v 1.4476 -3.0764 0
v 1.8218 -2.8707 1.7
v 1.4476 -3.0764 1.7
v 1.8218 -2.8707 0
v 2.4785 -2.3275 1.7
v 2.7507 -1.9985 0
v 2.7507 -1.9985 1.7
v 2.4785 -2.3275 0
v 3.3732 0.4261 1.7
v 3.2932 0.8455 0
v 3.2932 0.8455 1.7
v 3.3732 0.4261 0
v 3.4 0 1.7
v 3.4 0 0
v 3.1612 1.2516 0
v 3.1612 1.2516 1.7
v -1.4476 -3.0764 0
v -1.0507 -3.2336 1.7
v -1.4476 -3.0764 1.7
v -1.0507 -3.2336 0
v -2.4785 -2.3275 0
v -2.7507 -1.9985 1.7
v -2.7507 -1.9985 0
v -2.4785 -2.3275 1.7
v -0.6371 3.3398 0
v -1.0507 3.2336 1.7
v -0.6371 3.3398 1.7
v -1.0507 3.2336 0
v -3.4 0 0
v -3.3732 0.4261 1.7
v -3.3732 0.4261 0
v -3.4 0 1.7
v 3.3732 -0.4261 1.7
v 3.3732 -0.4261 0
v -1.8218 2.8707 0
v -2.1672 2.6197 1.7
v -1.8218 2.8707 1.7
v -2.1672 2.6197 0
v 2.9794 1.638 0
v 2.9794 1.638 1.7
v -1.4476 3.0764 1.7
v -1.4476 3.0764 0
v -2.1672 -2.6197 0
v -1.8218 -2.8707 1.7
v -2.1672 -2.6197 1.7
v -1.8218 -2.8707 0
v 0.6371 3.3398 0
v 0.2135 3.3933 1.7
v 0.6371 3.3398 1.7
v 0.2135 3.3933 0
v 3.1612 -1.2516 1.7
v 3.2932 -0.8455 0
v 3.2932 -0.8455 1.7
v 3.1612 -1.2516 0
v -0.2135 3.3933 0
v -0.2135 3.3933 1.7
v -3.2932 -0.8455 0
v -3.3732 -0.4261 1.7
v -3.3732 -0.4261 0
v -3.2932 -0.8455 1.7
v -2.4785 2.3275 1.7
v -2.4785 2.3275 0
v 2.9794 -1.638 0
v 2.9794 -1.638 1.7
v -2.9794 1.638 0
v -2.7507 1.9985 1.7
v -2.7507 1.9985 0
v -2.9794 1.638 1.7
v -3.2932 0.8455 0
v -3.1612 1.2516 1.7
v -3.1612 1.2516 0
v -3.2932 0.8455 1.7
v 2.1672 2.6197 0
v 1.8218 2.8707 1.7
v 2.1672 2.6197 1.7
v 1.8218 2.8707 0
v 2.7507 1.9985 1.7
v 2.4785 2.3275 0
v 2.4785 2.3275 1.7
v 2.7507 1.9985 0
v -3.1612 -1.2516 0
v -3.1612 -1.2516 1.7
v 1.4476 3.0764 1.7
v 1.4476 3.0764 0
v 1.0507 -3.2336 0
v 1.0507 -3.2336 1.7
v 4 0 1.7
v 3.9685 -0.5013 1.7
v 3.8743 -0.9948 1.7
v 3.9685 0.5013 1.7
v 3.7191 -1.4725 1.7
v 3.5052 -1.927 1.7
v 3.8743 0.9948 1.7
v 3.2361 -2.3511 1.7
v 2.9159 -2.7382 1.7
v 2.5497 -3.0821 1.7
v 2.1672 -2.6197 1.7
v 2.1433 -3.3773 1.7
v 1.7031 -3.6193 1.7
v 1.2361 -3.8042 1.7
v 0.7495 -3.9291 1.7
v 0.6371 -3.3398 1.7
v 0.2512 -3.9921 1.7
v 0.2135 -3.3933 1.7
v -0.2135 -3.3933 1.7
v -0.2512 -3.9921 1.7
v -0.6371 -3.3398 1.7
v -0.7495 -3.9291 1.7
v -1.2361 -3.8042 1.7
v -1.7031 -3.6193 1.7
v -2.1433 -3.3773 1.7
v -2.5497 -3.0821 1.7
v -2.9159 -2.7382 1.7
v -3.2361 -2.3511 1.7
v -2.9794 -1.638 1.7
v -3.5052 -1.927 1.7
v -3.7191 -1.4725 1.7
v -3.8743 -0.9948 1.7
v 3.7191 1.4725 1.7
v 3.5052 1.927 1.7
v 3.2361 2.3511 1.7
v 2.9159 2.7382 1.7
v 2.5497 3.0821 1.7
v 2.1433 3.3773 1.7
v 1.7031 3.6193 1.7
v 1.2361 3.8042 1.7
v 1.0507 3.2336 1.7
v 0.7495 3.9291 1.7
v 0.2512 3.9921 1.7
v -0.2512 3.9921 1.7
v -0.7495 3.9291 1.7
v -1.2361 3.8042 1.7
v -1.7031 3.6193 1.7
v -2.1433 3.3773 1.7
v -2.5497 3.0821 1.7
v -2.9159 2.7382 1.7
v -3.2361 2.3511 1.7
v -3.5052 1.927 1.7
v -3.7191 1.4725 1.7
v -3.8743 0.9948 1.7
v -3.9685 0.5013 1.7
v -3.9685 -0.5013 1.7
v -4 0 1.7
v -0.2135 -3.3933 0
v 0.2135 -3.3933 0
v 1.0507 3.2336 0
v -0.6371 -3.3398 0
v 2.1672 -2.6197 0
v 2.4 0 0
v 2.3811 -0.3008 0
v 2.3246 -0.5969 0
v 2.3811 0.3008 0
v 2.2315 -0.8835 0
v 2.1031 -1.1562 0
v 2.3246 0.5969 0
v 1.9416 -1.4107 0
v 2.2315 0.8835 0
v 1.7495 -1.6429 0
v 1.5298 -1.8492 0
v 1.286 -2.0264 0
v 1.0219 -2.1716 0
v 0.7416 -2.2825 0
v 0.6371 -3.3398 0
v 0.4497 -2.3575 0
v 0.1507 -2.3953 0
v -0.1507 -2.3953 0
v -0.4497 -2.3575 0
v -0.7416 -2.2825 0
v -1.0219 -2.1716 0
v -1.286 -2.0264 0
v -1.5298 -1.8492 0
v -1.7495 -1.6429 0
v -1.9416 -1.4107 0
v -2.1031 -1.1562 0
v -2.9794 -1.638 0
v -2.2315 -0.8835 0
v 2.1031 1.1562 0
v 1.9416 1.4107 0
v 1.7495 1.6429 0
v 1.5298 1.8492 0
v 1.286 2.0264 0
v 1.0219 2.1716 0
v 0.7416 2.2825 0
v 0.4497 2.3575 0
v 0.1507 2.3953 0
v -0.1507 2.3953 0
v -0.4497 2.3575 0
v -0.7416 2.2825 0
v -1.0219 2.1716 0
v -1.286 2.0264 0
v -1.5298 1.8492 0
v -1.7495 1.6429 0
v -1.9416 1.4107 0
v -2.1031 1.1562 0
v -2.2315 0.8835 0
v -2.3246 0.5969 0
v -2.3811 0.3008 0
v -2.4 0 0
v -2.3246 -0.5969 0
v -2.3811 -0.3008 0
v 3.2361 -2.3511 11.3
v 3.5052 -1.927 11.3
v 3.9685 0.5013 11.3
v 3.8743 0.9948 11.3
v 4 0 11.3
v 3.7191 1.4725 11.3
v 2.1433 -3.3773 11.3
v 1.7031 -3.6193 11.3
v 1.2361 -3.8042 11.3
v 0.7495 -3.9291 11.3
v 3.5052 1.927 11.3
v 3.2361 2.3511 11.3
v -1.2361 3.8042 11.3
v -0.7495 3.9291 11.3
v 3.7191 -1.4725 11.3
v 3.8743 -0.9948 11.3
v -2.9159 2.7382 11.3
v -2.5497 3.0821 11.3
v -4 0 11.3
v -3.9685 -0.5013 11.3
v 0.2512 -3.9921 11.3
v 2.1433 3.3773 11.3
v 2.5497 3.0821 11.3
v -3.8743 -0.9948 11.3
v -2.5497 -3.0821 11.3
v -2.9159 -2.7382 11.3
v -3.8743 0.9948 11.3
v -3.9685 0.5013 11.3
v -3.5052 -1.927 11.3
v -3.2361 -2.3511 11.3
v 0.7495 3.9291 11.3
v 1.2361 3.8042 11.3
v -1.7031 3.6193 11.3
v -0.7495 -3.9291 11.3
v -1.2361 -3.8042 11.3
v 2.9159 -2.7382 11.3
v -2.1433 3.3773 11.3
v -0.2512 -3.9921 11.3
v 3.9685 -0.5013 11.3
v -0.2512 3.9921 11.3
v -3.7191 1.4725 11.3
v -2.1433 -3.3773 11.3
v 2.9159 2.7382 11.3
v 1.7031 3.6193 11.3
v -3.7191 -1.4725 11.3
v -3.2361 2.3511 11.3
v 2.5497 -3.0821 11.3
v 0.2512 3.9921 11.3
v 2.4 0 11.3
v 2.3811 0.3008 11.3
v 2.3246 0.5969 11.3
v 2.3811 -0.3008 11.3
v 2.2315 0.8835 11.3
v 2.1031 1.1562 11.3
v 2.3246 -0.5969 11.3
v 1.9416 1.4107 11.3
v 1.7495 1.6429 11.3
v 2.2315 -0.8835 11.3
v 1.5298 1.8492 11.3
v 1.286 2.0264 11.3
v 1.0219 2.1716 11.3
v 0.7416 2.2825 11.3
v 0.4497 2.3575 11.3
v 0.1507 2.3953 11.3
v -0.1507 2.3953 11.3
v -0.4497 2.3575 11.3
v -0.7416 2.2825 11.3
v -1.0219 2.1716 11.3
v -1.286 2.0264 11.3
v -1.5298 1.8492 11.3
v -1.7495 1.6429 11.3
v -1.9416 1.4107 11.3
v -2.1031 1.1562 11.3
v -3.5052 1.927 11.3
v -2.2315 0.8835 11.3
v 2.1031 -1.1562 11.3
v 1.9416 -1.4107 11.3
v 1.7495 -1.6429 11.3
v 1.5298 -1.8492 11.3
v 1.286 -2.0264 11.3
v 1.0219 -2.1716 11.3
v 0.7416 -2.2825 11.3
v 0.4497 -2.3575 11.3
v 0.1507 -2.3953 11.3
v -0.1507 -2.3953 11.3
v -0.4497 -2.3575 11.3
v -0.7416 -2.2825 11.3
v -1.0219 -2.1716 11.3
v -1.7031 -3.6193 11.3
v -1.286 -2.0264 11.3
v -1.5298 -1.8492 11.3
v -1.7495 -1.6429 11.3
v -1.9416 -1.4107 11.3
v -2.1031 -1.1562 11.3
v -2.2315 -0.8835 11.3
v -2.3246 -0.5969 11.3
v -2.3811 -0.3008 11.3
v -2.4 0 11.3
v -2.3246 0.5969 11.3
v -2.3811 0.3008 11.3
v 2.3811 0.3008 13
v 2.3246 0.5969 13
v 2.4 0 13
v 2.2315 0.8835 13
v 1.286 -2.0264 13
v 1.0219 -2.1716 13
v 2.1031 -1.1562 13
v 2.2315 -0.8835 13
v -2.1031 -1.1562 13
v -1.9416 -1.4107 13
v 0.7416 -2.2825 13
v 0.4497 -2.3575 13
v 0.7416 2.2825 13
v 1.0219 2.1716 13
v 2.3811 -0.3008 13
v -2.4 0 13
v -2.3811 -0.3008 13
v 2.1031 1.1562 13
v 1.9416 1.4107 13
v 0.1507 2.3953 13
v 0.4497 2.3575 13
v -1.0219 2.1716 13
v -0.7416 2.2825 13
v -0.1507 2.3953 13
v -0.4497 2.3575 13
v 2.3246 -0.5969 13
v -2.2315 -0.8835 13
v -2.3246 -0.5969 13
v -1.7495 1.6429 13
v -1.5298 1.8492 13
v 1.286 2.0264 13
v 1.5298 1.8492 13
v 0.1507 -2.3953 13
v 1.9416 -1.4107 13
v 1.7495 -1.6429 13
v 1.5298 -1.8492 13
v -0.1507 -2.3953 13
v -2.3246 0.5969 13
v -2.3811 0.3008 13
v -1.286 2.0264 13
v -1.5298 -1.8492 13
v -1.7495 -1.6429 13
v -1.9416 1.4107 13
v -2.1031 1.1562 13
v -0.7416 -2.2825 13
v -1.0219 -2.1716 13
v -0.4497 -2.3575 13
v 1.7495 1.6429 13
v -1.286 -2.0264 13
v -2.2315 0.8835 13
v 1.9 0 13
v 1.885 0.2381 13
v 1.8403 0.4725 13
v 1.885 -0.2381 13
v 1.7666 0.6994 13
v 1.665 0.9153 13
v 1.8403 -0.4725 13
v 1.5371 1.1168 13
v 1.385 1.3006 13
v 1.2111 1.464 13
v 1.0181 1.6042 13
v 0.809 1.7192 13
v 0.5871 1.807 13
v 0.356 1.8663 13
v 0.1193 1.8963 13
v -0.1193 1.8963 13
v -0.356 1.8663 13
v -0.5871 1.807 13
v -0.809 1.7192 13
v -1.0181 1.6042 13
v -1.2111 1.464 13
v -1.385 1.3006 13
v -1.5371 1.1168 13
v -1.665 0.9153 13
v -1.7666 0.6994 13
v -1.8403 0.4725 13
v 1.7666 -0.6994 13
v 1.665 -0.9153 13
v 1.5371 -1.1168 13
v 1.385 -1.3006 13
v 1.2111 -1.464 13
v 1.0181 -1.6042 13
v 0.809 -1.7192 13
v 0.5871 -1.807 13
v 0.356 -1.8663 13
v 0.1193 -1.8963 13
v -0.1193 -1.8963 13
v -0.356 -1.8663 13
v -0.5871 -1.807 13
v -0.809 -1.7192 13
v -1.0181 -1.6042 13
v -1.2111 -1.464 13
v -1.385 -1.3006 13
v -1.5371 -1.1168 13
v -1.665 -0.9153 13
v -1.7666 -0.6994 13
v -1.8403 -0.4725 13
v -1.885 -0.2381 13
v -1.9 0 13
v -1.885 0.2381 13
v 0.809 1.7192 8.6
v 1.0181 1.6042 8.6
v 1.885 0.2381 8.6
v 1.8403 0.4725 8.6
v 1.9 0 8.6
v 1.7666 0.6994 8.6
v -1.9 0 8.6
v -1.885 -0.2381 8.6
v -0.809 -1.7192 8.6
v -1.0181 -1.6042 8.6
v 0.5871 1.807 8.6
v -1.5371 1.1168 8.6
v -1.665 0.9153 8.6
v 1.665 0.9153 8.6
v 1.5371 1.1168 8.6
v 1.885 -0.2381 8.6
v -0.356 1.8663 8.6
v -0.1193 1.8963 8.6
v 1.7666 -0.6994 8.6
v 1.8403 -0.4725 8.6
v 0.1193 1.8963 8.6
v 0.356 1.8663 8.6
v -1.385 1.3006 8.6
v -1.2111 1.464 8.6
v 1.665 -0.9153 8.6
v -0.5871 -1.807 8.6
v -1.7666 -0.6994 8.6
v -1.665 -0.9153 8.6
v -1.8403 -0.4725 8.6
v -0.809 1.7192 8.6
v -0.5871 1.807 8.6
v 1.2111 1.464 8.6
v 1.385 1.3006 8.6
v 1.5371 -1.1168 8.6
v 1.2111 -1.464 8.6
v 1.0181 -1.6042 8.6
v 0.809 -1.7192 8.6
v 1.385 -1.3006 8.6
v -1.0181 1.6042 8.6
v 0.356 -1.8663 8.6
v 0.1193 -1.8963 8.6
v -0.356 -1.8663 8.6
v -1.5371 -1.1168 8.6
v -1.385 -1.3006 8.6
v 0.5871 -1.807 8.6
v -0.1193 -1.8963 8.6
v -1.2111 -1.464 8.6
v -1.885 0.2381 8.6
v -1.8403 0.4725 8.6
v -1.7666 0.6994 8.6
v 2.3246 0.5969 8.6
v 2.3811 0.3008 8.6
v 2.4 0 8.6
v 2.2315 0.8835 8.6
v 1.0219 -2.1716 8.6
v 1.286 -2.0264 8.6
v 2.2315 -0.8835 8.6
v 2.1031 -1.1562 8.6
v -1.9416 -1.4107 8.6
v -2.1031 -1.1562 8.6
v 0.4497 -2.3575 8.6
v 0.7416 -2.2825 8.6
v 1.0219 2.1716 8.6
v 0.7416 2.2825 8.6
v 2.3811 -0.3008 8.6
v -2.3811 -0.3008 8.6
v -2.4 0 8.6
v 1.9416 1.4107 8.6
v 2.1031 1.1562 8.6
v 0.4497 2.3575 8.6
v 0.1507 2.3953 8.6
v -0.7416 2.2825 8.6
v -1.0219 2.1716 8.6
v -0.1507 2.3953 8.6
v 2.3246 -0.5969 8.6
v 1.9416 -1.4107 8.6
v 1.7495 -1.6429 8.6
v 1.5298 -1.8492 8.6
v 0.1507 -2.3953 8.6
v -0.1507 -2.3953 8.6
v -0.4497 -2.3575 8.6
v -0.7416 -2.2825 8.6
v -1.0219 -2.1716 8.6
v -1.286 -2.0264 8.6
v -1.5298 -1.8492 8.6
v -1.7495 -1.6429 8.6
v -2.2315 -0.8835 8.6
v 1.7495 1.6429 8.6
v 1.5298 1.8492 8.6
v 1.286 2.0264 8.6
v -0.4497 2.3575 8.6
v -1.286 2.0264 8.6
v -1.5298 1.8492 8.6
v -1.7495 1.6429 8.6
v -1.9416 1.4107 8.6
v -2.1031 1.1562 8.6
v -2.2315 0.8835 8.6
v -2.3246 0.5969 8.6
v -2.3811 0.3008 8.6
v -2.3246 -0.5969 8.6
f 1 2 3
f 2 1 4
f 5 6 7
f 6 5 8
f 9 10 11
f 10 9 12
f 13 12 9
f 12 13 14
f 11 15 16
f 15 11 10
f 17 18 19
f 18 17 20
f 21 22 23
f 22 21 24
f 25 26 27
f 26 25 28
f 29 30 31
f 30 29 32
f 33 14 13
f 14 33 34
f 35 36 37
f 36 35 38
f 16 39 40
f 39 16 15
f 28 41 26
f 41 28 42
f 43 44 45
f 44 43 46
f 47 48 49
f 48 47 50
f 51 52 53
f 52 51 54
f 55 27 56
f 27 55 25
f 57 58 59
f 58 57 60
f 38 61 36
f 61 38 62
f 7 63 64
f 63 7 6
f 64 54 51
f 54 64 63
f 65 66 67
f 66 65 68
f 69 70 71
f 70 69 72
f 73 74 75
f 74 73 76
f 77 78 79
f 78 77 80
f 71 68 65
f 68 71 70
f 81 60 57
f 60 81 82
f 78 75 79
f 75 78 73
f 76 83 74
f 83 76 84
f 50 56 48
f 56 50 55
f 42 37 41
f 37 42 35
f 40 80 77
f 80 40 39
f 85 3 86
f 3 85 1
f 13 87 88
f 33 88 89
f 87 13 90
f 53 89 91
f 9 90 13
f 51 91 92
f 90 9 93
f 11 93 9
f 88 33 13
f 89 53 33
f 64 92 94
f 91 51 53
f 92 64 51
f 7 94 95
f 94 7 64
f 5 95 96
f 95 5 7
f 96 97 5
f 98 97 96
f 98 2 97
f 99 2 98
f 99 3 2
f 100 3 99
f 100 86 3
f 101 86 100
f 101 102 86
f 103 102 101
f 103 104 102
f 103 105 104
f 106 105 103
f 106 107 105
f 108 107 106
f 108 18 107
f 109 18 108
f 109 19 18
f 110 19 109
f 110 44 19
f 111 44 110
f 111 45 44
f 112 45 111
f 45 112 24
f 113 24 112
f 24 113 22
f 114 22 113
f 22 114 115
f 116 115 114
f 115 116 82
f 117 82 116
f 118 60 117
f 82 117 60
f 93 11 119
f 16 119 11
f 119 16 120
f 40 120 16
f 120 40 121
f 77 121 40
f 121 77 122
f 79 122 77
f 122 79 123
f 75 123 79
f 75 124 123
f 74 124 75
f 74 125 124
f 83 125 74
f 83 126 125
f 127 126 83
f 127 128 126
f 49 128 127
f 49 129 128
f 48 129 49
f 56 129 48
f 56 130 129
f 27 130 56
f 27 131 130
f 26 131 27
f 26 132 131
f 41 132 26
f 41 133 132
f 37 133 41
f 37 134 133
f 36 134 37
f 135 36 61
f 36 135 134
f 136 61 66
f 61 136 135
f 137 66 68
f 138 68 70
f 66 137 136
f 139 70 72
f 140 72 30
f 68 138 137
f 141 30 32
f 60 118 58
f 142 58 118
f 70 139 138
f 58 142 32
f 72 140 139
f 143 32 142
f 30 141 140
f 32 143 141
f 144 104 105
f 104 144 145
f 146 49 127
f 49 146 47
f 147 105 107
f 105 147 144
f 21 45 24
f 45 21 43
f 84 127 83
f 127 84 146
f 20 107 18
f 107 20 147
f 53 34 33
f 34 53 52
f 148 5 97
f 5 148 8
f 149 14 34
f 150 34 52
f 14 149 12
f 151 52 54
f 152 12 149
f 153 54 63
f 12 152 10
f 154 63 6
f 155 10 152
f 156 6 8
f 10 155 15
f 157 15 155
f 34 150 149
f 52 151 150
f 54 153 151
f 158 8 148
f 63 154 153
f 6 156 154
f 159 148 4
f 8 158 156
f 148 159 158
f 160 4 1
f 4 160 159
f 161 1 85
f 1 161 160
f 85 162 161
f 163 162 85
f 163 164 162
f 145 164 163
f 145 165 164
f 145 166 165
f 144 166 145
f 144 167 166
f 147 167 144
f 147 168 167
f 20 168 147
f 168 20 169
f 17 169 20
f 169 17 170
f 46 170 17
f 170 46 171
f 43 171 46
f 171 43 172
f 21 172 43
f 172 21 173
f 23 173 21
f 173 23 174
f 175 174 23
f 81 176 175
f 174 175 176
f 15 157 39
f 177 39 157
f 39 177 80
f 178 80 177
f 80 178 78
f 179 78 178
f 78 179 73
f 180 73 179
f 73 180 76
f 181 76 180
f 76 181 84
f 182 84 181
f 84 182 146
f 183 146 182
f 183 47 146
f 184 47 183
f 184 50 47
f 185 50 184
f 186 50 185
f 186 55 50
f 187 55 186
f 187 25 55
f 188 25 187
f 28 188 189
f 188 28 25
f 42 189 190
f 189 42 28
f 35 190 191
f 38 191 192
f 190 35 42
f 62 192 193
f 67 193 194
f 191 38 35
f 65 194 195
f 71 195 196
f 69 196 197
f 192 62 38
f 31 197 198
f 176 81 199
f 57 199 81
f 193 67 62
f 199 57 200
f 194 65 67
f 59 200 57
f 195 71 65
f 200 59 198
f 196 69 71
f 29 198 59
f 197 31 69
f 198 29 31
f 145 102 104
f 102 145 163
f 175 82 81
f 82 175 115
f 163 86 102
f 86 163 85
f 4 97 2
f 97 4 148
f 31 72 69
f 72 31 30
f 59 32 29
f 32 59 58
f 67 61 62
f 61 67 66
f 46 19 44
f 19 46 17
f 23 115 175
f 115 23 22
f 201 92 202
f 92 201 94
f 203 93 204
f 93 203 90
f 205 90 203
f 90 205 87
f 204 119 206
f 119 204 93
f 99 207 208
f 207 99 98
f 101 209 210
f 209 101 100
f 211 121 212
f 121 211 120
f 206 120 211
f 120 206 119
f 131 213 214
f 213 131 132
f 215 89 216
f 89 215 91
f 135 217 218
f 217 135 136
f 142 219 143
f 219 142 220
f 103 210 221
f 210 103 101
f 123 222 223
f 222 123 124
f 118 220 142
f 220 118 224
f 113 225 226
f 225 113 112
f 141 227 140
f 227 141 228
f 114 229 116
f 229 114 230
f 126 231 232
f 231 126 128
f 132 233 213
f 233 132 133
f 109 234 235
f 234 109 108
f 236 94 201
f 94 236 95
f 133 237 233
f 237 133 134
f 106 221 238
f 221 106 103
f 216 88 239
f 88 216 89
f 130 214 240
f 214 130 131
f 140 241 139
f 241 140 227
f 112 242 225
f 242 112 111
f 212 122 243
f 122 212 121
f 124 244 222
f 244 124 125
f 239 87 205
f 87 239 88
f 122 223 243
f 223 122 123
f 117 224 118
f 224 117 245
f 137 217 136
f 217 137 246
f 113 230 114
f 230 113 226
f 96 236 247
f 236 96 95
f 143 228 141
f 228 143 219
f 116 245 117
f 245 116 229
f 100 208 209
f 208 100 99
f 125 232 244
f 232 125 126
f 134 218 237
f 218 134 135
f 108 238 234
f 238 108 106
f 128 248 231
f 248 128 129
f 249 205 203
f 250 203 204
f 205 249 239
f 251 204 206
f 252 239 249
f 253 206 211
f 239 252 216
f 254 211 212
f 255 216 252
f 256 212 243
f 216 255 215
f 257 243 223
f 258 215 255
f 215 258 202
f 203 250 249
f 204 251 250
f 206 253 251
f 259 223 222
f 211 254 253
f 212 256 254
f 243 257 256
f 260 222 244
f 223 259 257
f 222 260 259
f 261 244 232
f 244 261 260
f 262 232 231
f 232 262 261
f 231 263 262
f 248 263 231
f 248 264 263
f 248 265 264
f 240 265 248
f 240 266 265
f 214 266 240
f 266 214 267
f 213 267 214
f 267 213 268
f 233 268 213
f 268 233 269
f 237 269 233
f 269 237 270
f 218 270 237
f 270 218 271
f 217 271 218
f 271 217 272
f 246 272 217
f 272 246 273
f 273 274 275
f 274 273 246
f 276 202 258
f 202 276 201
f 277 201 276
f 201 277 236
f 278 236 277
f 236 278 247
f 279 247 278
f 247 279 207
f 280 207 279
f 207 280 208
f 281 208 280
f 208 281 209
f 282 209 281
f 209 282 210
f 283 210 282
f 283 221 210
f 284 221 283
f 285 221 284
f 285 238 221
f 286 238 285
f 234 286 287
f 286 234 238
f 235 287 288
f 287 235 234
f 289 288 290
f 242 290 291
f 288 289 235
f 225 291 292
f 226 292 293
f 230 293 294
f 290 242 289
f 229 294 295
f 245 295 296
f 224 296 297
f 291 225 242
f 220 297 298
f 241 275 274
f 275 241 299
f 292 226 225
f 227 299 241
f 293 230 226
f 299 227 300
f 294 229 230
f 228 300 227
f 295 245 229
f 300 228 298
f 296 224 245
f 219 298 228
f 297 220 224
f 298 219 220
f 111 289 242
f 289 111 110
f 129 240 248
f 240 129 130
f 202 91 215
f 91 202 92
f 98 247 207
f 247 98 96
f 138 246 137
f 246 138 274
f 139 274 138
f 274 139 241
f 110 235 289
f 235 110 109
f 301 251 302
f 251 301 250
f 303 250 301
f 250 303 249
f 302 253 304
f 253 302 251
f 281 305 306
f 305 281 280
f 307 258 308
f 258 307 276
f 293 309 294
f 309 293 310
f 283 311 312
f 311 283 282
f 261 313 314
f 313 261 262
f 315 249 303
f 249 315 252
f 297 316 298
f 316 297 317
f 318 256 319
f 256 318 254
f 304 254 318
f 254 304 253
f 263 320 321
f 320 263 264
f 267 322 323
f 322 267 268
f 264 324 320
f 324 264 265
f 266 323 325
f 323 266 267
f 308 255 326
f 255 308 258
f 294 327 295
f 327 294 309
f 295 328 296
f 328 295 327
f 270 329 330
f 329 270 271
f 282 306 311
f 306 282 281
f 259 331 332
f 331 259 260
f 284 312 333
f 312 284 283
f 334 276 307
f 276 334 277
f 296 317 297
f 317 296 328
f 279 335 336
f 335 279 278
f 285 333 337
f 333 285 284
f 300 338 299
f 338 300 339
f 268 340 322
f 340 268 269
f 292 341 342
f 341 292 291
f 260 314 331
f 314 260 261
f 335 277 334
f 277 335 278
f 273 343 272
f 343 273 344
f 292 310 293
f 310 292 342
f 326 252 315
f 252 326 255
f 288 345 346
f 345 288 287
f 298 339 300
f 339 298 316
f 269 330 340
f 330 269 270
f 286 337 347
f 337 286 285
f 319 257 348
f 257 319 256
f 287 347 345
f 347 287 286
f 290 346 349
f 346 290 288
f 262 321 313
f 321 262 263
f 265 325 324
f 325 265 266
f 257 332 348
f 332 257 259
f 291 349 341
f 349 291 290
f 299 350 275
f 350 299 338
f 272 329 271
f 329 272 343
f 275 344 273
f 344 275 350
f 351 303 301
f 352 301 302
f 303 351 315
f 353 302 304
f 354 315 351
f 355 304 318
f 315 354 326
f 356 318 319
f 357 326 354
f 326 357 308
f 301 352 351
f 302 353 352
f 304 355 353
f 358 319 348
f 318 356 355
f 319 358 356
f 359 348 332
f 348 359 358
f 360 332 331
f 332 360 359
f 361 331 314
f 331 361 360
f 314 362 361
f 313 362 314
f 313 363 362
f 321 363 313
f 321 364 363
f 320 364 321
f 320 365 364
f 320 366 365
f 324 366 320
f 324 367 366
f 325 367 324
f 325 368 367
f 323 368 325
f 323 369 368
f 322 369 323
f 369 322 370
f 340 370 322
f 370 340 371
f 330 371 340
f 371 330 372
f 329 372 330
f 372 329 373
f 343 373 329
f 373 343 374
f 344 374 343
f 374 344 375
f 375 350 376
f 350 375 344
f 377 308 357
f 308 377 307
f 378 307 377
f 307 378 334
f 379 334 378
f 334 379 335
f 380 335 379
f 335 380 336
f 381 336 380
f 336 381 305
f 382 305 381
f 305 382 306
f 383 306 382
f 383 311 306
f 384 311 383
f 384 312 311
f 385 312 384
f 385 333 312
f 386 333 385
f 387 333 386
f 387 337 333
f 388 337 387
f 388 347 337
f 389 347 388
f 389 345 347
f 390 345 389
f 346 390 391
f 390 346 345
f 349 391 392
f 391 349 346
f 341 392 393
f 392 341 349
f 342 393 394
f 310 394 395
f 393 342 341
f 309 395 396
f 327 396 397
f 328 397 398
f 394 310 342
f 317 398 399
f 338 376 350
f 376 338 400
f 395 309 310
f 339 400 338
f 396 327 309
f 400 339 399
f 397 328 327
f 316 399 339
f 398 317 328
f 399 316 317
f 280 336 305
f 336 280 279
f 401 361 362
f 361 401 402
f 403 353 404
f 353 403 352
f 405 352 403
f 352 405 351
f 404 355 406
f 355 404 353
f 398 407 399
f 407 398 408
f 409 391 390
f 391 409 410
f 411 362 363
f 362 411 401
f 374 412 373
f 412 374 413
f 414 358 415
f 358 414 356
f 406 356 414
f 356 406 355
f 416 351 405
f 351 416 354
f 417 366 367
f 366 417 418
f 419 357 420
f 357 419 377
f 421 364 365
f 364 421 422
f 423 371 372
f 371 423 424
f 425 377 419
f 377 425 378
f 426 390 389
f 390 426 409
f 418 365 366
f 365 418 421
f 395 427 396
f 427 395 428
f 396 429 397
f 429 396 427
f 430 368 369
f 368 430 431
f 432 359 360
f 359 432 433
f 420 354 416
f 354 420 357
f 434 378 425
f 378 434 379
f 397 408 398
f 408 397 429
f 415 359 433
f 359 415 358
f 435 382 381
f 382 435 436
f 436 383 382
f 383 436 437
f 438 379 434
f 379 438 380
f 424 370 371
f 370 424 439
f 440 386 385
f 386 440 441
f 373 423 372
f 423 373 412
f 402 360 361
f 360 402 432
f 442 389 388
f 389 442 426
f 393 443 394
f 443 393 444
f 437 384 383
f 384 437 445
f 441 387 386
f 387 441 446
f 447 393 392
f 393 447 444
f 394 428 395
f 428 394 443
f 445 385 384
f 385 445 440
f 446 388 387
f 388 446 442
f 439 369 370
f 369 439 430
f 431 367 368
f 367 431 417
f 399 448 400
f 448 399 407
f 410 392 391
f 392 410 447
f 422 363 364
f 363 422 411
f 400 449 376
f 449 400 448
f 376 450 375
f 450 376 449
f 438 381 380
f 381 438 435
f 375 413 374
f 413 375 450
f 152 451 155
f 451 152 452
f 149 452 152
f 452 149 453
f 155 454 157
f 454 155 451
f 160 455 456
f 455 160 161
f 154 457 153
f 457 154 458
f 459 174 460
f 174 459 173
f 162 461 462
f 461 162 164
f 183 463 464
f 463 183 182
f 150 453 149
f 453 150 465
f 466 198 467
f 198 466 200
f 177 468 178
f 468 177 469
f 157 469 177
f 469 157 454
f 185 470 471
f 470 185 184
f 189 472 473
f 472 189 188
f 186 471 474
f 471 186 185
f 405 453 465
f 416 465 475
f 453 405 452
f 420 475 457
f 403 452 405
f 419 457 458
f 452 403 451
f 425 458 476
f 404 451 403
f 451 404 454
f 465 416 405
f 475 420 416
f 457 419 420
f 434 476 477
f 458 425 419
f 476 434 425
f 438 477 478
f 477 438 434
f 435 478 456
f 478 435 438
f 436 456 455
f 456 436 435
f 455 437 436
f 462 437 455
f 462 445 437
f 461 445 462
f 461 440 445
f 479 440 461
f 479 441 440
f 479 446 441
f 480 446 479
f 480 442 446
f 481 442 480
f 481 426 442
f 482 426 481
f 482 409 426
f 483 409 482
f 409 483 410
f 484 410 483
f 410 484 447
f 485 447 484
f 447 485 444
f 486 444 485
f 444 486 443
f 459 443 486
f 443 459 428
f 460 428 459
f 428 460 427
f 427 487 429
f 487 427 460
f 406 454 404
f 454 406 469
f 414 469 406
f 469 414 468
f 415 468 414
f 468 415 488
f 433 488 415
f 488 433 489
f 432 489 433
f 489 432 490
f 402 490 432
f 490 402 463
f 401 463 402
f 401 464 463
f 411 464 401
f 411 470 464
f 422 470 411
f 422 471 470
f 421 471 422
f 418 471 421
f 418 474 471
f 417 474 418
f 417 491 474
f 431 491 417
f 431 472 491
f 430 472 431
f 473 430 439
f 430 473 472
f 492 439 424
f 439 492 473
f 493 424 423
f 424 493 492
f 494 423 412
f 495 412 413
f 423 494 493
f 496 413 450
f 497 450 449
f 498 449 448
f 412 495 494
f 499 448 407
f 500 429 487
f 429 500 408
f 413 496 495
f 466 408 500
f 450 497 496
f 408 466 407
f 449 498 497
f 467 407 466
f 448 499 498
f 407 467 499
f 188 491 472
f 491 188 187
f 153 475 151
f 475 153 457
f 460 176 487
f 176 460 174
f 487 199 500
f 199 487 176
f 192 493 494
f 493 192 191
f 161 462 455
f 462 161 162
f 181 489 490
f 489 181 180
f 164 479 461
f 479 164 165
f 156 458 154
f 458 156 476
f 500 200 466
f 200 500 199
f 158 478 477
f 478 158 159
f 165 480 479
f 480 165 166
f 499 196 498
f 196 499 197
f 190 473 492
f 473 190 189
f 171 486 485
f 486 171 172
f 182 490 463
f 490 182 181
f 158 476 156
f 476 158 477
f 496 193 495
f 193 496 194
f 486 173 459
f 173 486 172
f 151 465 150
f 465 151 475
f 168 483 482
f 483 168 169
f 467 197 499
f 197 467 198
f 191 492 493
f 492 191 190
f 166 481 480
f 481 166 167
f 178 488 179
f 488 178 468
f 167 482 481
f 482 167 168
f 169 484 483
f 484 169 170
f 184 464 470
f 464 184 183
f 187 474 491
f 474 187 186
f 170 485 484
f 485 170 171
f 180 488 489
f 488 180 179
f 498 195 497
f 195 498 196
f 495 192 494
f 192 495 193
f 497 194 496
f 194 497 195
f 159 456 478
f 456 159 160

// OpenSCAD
/* [Brick settings] */
//Brick diameter
lego_diam = 8.0;
//Height of entire brick
lego_height = 13;

/* [Pin Settings] */
//Height of pin
pin_height = 1.7;
//Diameter of pin
pin_diam = 4.8;
//Diameter addition for pin Hole (bottom)
pin_diff = 1.0;

/* [Hidden] */
//This tells OpenScad to make the circle really round
$fn = 50;
pin_rad = pin_diam / 2;
lego_rad = lego_diam / 2;
hole_rad = pin_rad-pin_diff/2;
hole_rad2 = pin_rad;

difference()
{
union()
{
    cylinder(pin_height, pin_rad+pin_diff, pin_rad+pin_diff);
    translate([0,0,pin_height])
        cylinder(lego_height-pin_height*2, lego_rad, lego_rad);
    translate([0,0,lego_height-pin_height])
        cylinder(pin_height, pin_rad, pin_rad);
}
translate([0,0,-1])
//Two pins, lego height + 2 to make sure the hole exceeds the model
    cylinder(pin_height*2+lego_height+2, hole_rad, hole_rad);
translate([0,0,-1])
    cylinder(lego_height-pin_height*2, hole_rad2, hole_rad2);
}
